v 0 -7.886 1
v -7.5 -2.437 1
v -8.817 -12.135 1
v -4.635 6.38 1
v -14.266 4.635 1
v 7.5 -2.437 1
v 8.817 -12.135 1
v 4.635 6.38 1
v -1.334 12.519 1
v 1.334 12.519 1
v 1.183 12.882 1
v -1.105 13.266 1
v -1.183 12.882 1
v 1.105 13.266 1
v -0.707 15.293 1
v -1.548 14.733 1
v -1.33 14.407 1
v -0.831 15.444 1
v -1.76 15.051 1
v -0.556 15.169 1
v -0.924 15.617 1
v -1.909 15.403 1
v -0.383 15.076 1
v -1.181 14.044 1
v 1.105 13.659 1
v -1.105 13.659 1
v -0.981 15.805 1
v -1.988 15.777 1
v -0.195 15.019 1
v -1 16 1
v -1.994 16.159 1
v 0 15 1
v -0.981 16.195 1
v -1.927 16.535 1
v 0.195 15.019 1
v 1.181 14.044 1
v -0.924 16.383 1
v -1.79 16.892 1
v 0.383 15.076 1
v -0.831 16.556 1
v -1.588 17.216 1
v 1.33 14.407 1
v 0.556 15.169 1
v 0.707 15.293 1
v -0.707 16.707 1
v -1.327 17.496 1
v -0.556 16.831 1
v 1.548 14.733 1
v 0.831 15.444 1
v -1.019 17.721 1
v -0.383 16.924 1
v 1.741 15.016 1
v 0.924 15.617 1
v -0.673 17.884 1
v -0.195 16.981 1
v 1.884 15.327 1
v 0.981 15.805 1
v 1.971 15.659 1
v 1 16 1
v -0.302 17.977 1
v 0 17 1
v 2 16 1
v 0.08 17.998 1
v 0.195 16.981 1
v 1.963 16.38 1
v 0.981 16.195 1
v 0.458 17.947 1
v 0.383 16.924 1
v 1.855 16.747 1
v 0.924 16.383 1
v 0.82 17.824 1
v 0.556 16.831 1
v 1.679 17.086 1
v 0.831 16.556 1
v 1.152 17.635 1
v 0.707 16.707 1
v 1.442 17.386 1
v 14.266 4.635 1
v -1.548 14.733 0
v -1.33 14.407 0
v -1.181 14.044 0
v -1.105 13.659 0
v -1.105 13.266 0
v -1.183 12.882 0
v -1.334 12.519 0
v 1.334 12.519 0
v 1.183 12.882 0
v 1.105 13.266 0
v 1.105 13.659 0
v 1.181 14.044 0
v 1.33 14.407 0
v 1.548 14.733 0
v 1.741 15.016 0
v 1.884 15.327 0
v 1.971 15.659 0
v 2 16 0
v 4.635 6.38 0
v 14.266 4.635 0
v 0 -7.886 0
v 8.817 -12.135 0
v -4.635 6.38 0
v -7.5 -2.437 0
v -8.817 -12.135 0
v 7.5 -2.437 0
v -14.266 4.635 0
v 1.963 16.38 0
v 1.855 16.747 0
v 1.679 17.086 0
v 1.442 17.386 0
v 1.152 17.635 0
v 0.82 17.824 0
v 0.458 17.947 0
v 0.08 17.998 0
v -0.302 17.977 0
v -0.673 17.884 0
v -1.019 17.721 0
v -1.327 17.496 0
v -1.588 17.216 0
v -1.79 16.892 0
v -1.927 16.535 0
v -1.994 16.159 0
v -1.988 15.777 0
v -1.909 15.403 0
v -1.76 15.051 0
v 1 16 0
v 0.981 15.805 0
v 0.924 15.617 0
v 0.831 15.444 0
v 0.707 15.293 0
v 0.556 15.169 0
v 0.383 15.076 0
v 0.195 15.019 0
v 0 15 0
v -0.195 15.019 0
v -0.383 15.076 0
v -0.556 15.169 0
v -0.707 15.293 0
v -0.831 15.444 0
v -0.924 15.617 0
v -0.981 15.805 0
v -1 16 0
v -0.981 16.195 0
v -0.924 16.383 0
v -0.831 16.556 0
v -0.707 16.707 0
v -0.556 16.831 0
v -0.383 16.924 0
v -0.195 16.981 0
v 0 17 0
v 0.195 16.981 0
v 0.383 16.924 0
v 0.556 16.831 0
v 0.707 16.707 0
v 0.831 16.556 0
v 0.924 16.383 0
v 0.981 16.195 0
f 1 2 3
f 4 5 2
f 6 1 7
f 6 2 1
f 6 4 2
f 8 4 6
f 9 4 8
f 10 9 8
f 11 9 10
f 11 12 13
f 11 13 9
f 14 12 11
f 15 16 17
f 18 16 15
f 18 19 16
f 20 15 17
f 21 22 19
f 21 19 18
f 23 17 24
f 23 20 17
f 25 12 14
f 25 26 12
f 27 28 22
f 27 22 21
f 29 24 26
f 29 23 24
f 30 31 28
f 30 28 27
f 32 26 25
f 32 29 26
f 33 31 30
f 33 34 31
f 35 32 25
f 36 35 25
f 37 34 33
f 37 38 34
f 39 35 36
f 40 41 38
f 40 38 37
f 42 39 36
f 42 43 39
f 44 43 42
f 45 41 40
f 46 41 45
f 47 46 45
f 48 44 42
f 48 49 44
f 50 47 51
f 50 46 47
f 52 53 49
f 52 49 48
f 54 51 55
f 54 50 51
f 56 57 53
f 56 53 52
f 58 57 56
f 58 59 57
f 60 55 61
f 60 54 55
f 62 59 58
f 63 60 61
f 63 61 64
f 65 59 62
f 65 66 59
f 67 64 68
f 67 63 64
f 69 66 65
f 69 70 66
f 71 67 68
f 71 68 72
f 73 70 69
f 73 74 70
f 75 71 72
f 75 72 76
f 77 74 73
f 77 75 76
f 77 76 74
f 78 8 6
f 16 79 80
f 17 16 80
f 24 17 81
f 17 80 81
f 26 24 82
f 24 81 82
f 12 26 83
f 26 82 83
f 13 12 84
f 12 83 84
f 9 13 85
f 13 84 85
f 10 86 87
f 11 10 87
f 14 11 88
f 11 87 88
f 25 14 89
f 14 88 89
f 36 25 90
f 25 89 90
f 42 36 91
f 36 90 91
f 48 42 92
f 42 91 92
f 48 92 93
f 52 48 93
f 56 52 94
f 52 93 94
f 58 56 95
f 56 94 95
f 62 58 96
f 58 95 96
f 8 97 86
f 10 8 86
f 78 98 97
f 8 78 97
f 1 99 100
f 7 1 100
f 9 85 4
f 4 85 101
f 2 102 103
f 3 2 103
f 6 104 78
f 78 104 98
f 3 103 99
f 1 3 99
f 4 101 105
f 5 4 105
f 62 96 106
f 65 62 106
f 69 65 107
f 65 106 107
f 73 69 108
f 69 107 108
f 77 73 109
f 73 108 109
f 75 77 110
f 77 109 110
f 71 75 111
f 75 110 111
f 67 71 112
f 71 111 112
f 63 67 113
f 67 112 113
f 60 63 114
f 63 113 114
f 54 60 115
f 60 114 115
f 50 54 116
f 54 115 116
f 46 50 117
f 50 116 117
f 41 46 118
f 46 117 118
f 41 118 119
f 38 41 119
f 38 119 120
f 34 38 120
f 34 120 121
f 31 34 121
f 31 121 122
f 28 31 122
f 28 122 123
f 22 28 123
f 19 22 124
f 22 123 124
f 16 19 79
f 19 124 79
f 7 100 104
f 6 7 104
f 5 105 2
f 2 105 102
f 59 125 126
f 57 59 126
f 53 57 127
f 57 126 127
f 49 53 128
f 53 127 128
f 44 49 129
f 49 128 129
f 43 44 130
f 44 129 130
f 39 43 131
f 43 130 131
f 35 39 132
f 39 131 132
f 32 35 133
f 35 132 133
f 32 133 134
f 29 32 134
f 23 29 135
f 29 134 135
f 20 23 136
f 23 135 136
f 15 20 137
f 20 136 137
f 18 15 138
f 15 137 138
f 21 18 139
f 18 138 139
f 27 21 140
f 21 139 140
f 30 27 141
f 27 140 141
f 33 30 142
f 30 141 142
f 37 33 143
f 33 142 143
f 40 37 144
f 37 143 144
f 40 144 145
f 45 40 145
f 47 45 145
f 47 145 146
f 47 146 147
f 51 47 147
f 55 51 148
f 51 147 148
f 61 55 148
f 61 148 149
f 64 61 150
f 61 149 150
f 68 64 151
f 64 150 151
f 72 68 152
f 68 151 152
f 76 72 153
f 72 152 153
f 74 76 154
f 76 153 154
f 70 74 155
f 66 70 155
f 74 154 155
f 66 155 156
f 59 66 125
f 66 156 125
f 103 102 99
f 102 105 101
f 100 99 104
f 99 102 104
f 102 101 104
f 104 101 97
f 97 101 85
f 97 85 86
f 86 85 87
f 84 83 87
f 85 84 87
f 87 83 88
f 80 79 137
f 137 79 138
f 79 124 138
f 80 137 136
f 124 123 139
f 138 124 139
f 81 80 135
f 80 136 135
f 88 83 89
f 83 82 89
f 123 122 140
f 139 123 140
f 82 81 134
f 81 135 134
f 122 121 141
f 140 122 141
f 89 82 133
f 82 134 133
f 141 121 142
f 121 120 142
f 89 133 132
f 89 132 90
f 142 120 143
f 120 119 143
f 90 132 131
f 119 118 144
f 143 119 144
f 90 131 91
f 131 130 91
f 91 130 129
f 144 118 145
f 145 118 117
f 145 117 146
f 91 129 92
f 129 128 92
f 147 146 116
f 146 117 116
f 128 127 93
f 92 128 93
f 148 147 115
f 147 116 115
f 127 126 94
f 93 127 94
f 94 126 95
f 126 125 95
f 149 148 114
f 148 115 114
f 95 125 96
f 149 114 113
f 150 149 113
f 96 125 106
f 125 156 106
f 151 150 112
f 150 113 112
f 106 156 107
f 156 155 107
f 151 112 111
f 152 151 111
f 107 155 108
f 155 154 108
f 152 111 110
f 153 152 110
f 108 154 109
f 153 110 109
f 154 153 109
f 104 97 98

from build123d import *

# Parameters (mm, degrees)
F1_DEPTH = 1


with BuildPart() as f1:
    # F0 (on Top) → F1 (new body)
    with BuildSketch(Plane.XY):
        with BuildLine():
            Line((4.6352549156, 6.3798810626), (1.3339177444, 12.5193317695))
            Line((1.3339177444, 12.5193317695), (0.503138004, 14.0643212692))
            ThreePointArc((0.503138004, 14.0643212692), (0, 14), (-0.503138004, 14.0643212692))
            Line((-0.503138004, 14.0643212692), (-1.3339177444, 12.5193317695))
            Line((-1.3339177444, 12.5193317695), (-4.6352549156, 6.3798810626))
            Line((-4.6352549156, 6.3798810626), (-14.2658477444, 4.6352549156))
            Line((-14.2658477444, 4.6352549156), (-7.5, -2.4368977217))
            Line((-7.5, -2.4368977217), (-8.8167787844, -12.1352549156))
            Line((-8.8167787844, -12.1352549156), (0, -7.8859666818))
            Line((0, -7.8859666818), (8.8167787844, -12.1352549156))
            Line((8.8167787844, -12.1352549156), (7.5, -2.4368977217))
            Line((7.5, -2.4368977217), (14.2658477444, 4.6352549156))
            Line((14.2658477444, 4.6352549156), (4.6352549156, 6.3798810626))
        make_face()
        with BuildLine():
            Line((0.503138004, 14.0643212692), (1.3339177444, 12.5193317695))
            ThreePointArc((1.3339177444, 12.5193317695), (1.1046607275, 13.6587566576), (1.547700554, 14.7332628547))
            ThreePointArc((1.547700554, 14.7332628547), (1.0785895461, 14.315765874), (0.503138004, 14.0643212692))
        make_face()
        with BuildLine():
            ThreePointArc((-0.503138004, 14.0643212692), (0, 14), (0.503138004, 14.0643212692))
            Line((0.503138004, 14.0643212692), (0, 15))
            Line((0, 15), (-0.503138004, 14.0643212692))
        make_face()
        with BuildLine():
            Line((-1.3339177444, 12.5193317695), (-0.503138004, 14.0643212692))
            ThreePointArc((-0.503138004, 14.0643212692), (-1.0785895461, 14.315765874), (-1.547700554, 14.7332628547))
            ThreePointArc((-1.547700554, 14.7332628547), (-1.1046607275, 13.6587566576), (-1.3339177444, 12.5193317695))
        make_face()
        with BuildLine():
            Line((0, 15), (0.503138004, 14.0643212692))
            ThreePointArc((0.503138004, 14.0643212692), (1.0785895461, 14.315765874), (1.547700554, 14.7332628547))
            ThreePointArc((1.547700554, 14.7332628547), (1.8835340597, 15.3274678848), (2, 16))
            ThreePointArc((2, 16), (-0.6725321152, 17.8835340597), (-1.547700554, 14.7332628547))
            ThreePointArc((-1.547700554, 14.7332628547), (-1.0785895461, 14.315765874), (-0.503138004, 14.0643212692))
            Line((-0.503138004, 14.0643212692), (0, 15))
        make_face()
        with BuildLine():
            ThreePointArc((1, 16), (0.7071067812, 15.2928932188), (0, 15))
            ThreePointArc((0, 15), (-0.7071067812, 16.7071067812), (1, 16))
        make_face(mode=Mode.SUBTRACT)
    extrude(amount=F1_DEPTH)


solid = f1.part
